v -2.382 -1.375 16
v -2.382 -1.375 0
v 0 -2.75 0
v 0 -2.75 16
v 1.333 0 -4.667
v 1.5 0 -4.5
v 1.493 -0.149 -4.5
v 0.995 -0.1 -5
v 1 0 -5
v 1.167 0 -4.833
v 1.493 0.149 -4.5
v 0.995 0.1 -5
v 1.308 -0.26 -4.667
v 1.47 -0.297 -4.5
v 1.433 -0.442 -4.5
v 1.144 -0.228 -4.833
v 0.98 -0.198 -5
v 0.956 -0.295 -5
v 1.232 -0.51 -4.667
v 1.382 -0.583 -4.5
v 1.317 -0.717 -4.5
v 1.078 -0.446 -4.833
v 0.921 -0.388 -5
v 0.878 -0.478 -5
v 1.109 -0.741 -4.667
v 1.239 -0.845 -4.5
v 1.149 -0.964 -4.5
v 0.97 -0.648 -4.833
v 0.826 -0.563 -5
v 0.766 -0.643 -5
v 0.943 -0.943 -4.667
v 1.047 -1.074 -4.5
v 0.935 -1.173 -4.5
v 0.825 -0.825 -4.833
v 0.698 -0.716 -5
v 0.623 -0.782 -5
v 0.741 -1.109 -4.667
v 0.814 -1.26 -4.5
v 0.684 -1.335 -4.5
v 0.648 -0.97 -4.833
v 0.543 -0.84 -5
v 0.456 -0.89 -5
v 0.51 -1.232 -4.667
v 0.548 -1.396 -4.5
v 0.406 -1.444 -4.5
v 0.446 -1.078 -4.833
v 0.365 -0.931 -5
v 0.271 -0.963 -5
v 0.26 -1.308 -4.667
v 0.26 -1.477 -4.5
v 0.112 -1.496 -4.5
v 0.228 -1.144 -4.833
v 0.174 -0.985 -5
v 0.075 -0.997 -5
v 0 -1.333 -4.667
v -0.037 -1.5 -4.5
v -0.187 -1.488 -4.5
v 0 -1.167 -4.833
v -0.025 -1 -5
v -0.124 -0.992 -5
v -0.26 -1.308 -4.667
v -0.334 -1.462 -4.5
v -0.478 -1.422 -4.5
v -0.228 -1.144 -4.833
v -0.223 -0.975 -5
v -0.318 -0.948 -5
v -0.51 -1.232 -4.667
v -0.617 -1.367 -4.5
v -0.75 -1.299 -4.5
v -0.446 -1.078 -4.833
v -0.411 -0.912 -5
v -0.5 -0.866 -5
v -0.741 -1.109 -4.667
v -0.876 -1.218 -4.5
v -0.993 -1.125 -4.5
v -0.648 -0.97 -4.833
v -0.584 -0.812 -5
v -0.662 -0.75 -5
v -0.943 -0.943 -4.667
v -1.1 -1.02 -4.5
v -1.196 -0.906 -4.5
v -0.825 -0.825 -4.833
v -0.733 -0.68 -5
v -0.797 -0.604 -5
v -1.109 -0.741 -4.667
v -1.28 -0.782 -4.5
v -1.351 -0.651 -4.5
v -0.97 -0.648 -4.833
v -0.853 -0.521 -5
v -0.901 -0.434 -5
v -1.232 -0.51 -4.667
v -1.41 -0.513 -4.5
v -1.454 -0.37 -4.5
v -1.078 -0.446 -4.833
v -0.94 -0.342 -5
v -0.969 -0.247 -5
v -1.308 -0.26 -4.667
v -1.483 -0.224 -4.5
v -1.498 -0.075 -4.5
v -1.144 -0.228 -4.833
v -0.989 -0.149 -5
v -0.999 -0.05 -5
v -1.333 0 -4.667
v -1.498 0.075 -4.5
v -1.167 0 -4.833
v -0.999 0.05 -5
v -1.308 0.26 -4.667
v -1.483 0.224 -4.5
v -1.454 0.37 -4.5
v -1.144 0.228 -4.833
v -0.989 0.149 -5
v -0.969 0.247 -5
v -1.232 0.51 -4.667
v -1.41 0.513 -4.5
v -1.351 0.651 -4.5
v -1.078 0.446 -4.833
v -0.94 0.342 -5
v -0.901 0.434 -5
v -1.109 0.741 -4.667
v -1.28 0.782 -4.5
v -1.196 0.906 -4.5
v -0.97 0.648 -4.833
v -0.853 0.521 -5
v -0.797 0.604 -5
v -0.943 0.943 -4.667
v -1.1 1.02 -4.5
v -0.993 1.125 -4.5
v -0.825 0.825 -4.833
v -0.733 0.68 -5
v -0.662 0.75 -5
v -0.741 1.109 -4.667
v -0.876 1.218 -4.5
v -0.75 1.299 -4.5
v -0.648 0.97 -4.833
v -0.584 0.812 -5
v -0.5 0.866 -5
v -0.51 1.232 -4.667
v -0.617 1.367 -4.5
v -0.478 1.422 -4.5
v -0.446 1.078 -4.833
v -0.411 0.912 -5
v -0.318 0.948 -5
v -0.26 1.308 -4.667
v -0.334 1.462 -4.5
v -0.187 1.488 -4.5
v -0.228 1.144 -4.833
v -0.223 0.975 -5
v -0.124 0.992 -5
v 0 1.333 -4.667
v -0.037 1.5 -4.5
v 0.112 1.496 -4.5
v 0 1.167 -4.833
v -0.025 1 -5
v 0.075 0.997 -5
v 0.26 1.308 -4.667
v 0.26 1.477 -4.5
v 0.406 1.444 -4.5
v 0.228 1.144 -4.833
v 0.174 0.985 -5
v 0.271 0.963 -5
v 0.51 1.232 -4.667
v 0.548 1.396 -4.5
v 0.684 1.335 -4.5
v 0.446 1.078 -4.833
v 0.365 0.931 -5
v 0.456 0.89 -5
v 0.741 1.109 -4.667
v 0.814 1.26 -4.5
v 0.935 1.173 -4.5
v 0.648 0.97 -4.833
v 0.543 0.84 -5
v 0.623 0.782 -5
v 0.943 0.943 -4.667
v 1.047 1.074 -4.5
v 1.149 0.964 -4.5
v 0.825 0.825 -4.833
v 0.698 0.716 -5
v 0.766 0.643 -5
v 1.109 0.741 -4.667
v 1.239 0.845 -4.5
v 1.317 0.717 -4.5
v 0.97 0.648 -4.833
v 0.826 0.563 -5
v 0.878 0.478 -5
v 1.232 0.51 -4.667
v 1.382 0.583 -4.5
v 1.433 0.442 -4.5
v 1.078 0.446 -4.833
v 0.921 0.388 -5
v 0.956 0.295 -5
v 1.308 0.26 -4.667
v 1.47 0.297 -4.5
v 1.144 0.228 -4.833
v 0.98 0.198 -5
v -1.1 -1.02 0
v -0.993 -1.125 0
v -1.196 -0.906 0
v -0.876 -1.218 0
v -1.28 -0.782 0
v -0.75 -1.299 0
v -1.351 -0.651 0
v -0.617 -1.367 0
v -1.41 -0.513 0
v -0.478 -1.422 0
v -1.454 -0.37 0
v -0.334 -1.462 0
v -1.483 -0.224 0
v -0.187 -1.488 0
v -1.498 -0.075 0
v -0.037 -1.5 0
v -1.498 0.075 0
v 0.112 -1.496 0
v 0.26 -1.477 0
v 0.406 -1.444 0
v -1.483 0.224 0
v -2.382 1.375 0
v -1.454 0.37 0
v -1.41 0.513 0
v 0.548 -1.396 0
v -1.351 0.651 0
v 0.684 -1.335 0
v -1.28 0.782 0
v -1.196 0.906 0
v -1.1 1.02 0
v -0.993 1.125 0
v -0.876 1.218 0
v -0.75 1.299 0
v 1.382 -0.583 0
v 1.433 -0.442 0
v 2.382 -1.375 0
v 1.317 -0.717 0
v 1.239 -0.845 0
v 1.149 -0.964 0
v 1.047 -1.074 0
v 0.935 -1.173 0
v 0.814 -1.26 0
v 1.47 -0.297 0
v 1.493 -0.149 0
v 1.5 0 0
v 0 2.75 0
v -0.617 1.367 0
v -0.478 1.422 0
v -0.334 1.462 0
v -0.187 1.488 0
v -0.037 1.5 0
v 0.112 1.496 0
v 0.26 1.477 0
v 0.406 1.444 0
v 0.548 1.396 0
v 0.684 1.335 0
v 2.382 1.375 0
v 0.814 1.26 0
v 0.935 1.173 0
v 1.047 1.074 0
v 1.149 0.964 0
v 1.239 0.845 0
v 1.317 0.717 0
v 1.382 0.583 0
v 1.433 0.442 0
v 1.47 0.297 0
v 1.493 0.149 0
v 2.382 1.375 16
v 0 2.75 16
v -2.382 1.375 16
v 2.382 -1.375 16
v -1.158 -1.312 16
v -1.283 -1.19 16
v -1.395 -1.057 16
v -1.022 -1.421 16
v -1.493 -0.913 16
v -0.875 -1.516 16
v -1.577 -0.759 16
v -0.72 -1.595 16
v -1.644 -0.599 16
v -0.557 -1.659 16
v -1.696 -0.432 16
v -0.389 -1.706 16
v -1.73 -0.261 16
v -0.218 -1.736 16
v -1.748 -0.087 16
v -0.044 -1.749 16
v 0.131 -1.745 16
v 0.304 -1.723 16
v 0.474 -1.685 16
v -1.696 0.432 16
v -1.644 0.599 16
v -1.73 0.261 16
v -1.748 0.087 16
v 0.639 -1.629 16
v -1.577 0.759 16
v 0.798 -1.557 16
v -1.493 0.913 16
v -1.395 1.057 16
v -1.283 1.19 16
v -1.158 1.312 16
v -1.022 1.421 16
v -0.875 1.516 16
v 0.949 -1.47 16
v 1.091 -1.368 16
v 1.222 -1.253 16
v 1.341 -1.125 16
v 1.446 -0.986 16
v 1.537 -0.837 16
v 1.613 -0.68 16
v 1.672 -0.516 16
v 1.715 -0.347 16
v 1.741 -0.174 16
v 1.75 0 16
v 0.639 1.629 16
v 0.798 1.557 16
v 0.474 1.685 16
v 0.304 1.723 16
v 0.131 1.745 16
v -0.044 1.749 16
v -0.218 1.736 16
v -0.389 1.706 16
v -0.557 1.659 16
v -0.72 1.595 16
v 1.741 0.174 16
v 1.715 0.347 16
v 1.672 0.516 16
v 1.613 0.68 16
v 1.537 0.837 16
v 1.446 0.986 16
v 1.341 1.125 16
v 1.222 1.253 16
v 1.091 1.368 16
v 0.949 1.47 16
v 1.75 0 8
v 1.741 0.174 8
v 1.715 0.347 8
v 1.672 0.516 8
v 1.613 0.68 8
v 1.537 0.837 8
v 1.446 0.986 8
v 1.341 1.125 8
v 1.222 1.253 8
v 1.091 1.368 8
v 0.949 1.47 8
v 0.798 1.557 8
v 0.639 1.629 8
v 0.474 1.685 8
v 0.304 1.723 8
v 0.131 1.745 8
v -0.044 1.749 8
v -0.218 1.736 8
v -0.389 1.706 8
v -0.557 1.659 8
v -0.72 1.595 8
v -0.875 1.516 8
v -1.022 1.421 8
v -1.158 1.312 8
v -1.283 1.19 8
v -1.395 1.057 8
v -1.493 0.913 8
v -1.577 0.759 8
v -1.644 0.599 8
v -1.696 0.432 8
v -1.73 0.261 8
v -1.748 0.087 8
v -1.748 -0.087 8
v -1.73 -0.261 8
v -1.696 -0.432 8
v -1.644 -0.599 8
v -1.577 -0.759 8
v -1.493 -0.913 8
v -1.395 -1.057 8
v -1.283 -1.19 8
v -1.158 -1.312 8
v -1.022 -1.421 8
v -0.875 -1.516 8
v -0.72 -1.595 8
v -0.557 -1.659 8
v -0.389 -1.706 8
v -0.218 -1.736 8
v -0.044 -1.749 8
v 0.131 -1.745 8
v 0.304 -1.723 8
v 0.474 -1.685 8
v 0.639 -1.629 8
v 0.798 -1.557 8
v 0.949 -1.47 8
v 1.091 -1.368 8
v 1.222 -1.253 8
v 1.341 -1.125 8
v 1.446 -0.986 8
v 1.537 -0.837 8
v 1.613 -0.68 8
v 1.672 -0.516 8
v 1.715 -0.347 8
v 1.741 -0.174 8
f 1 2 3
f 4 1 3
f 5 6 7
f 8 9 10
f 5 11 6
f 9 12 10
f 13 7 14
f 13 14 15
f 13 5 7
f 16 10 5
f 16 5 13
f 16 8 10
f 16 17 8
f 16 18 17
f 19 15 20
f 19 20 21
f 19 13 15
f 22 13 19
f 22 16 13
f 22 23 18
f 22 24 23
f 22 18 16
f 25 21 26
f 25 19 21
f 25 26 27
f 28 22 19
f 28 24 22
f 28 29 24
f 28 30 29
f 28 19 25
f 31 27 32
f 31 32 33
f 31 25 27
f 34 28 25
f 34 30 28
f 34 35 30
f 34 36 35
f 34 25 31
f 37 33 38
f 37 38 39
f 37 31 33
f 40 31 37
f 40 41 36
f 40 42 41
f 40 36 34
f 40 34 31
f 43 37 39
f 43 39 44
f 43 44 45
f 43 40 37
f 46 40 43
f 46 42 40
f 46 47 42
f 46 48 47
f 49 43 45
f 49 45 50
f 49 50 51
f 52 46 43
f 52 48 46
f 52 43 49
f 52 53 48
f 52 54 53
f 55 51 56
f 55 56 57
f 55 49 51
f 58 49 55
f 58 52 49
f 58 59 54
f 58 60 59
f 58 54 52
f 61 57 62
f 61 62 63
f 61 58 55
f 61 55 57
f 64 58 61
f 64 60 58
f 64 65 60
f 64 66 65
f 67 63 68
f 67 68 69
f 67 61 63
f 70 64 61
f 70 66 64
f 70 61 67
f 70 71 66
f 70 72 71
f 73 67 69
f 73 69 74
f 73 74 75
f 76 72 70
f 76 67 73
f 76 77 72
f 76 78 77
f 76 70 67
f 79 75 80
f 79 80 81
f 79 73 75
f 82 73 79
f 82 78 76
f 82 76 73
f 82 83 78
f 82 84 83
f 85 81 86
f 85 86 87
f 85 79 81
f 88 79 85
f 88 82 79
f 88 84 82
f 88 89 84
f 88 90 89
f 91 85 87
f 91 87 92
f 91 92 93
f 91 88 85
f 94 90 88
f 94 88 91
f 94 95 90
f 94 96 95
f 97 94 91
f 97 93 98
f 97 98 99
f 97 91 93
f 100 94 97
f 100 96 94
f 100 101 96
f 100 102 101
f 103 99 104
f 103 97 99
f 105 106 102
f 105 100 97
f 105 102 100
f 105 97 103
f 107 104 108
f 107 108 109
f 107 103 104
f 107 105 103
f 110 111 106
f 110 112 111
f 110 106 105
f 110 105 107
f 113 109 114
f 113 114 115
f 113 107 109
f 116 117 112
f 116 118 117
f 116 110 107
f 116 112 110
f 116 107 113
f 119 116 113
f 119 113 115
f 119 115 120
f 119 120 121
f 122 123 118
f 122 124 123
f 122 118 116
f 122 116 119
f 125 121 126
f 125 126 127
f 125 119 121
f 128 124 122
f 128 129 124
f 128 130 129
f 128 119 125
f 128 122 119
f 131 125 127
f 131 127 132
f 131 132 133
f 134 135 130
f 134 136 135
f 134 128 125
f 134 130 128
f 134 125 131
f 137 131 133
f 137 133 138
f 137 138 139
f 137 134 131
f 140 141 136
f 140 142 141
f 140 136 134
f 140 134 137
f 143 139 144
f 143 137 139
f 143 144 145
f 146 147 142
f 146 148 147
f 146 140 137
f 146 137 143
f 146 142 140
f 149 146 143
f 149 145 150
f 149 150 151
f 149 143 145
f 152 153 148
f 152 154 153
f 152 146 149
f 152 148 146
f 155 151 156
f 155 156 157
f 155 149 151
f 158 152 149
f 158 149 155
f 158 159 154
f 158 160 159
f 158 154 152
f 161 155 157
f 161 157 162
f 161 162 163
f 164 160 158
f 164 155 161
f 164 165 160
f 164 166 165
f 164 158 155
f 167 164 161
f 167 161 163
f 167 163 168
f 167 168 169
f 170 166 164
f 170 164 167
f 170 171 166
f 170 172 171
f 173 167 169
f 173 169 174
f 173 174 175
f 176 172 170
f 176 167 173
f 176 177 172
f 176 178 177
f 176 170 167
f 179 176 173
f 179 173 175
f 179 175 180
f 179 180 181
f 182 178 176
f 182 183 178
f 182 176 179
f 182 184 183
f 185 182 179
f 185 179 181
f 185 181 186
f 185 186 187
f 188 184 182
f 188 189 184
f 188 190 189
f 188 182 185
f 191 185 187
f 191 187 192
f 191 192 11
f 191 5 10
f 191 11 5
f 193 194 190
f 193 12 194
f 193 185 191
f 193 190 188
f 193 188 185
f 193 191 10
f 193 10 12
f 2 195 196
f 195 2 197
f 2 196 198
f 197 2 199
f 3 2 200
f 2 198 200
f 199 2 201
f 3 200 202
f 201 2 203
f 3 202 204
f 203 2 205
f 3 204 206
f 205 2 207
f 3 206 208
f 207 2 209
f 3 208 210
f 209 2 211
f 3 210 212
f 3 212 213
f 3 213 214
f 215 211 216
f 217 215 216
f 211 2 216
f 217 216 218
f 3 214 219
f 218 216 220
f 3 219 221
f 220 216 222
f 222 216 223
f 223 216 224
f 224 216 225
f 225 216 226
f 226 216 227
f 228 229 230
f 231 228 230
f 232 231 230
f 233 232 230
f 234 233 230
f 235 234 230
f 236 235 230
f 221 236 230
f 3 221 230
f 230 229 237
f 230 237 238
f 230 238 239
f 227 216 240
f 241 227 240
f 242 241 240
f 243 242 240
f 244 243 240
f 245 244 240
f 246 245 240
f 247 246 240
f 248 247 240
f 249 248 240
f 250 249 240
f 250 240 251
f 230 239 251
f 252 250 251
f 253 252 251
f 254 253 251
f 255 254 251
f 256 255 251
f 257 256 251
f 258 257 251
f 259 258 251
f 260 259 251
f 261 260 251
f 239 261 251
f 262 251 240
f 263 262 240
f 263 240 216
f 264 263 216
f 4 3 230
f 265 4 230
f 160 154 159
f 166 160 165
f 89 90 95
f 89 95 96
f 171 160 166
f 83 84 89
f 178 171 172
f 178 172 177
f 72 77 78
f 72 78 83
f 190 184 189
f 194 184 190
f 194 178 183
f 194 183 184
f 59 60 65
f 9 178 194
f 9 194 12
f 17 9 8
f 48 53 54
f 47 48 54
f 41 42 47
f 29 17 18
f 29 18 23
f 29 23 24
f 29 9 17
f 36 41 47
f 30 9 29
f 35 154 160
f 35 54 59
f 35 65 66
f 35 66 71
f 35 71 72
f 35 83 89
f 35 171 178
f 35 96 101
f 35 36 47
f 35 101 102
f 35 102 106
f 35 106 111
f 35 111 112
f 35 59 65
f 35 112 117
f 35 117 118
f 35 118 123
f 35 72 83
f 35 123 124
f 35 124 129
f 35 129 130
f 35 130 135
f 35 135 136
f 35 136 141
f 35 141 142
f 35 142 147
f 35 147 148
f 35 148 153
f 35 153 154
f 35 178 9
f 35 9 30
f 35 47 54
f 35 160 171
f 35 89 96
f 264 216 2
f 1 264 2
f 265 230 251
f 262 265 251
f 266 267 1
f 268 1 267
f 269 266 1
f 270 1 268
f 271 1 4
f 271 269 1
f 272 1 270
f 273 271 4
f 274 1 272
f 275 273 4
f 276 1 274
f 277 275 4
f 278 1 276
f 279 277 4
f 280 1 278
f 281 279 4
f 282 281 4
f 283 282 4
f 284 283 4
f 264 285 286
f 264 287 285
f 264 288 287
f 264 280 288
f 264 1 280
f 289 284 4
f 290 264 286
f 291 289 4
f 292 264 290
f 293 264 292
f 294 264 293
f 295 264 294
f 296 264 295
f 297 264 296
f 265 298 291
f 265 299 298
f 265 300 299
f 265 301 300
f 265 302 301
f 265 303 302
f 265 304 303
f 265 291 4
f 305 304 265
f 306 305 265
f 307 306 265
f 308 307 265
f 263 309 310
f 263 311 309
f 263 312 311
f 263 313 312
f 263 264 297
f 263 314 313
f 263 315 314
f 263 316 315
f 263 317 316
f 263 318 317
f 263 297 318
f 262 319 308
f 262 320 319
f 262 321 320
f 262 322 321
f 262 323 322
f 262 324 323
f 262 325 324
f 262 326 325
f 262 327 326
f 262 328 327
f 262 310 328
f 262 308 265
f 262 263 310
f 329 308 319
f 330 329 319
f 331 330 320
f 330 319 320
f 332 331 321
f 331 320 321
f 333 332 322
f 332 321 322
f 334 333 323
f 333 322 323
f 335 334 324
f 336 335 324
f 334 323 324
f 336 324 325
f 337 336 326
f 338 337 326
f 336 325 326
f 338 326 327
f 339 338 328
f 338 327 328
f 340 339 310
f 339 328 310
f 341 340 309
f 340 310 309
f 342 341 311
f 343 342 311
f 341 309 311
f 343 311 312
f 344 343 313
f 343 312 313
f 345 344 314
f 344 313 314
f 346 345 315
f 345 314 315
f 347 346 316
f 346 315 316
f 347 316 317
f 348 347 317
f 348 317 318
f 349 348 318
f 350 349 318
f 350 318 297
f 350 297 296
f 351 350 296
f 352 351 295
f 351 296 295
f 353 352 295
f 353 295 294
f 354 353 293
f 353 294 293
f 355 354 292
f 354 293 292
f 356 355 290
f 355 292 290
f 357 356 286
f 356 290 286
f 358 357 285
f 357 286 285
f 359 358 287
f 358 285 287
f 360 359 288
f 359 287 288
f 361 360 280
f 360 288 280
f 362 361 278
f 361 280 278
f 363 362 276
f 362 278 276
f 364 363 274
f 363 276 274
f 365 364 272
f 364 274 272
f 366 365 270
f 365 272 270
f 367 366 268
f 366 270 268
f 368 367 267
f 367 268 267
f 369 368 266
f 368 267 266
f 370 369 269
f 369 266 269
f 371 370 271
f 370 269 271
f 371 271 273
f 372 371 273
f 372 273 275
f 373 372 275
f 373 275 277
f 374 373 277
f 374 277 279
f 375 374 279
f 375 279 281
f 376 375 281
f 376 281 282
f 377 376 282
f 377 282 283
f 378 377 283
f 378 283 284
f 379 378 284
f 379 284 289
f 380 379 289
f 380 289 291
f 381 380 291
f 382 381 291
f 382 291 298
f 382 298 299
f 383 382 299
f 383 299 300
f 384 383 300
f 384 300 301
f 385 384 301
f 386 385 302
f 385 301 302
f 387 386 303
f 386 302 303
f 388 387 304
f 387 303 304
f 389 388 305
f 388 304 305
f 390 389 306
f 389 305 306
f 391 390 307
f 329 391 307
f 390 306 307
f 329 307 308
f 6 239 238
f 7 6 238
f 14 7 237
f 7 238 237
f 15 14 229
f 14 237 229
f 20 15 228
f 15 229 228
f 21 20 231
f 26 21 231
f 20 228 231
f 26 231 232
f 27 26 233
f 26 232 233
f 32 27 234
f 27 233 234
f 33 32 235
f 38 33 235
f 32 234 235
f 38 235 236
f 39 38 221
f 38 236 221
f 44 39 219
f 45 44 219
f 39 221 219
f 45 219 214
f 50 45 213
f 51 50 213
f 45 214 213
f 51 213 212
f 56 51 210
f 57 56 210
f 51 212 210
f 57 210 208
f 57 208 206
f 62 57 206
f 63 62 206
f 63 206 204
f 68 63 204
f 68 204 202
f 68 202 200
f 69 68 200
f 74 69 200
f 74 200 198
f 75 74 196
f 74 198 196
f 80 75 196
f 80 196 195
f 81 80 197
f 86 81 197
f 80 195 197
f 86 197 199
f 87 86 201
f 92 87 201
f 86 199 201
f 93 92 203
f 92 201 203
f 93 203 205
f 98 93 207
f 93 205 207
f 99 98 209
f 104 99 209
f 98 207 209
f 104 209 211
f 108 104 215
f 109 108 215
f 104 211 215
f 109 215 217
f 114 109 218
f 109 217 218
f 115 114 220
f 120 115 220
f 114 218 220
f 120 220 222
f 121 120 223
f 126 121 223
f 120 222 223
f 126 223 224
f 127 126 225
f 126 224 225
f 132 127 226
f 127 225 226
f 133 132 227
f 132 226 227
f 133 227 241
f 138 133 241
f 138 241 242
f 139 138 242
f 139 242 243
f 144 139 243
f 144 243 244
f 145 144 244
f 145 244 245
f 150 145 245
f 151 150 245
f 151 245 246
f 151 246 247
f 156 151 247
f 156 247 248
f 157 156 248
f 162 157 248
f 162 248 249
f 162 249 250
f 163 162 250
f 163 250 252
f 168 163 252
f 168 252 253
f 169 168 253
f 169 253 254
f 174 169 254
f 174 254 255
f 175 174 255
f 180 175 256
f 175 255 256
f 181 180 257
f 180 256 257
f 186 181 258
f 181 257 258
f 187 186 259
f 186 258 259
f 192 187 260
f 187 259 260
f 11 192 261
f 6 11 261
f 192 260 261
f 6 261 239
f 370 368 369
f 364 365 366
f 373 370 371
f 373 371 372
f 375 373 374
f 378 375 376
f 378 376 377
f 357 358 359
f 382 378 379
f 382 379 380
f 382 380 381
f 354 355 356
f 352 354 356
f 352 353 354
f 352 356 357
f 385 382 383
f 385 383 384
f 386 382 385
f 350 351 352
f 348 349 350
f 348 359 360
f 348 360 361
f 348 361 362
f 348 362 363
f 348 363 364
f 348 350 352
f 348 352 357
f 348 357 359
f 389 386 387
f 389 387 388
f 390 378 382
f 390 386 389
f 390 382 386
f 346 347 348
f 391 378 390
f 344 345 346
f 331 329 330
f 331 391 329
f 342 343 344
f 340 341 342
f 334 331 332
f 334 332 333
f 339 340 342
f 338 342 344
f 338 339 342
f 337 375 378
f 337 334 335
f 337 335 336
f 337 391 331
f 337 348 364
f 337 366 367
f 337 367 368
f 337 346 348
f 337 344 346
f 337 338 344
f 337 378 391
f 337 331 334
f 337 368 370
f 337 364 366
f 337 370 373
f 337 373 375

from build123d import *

# Parameters (mm, degrees)
BOSS_EXTRUDE1_DEPTH = 16
SKETCH2_R           = 1.75
CUT_EXTRUDE1_DEPTH  = 8
SKETCH3_R           = 1.5
BOSS_EXTRUDE2_DEPTH = 5
CHAMFER1_SIZE       = 0.5


with BuildPart() as part:
    # Sketch1 → Boss-Extrude1 (new body)
    with BuildSketch(Plane.XY):
        Polygon((0, 2.75), (-2.38156986, 1.375), (-2.38156986, -1.375), (0, -2.75), (2.38156986, -1.375), (2.38156986, 1.375), align=None)
    extrude(amount=BOSS_EXTRUDE1_DEPTH)

    # Sketch2 → Cut-Extrude1 (cut)
    with BuildSketch(Plane.XY.offset(16)):
        Circle(SKETCH2_R)
    extrude(amount=-CUT_EXTRUDE1_DEPTH, mode=Mode.SUBTRACT)

    # Sketch3 → Boss-Extrude2 (add)
    with BuildSketch(Plane(origin=(0, 0, 0), x_dir=(-1, 0, 0), z_dir=(0, 0, -1))):
        with Locations(Location((0, 0, 0), (0, 0, 180))):
            Circle(SKETCH3_R)
    extrude(amount=BOSS_EXTRUDE2_DEPTH)

    # Chamfer1
    chamfer1_edges = [part.edges().sort_by_distance(p)[0] for p in [
        (-1.5, 0, -5),
    ]]
    chamfer(chamfer1_edges, length=CHAMFER1_SIZE)


solid = part.part
